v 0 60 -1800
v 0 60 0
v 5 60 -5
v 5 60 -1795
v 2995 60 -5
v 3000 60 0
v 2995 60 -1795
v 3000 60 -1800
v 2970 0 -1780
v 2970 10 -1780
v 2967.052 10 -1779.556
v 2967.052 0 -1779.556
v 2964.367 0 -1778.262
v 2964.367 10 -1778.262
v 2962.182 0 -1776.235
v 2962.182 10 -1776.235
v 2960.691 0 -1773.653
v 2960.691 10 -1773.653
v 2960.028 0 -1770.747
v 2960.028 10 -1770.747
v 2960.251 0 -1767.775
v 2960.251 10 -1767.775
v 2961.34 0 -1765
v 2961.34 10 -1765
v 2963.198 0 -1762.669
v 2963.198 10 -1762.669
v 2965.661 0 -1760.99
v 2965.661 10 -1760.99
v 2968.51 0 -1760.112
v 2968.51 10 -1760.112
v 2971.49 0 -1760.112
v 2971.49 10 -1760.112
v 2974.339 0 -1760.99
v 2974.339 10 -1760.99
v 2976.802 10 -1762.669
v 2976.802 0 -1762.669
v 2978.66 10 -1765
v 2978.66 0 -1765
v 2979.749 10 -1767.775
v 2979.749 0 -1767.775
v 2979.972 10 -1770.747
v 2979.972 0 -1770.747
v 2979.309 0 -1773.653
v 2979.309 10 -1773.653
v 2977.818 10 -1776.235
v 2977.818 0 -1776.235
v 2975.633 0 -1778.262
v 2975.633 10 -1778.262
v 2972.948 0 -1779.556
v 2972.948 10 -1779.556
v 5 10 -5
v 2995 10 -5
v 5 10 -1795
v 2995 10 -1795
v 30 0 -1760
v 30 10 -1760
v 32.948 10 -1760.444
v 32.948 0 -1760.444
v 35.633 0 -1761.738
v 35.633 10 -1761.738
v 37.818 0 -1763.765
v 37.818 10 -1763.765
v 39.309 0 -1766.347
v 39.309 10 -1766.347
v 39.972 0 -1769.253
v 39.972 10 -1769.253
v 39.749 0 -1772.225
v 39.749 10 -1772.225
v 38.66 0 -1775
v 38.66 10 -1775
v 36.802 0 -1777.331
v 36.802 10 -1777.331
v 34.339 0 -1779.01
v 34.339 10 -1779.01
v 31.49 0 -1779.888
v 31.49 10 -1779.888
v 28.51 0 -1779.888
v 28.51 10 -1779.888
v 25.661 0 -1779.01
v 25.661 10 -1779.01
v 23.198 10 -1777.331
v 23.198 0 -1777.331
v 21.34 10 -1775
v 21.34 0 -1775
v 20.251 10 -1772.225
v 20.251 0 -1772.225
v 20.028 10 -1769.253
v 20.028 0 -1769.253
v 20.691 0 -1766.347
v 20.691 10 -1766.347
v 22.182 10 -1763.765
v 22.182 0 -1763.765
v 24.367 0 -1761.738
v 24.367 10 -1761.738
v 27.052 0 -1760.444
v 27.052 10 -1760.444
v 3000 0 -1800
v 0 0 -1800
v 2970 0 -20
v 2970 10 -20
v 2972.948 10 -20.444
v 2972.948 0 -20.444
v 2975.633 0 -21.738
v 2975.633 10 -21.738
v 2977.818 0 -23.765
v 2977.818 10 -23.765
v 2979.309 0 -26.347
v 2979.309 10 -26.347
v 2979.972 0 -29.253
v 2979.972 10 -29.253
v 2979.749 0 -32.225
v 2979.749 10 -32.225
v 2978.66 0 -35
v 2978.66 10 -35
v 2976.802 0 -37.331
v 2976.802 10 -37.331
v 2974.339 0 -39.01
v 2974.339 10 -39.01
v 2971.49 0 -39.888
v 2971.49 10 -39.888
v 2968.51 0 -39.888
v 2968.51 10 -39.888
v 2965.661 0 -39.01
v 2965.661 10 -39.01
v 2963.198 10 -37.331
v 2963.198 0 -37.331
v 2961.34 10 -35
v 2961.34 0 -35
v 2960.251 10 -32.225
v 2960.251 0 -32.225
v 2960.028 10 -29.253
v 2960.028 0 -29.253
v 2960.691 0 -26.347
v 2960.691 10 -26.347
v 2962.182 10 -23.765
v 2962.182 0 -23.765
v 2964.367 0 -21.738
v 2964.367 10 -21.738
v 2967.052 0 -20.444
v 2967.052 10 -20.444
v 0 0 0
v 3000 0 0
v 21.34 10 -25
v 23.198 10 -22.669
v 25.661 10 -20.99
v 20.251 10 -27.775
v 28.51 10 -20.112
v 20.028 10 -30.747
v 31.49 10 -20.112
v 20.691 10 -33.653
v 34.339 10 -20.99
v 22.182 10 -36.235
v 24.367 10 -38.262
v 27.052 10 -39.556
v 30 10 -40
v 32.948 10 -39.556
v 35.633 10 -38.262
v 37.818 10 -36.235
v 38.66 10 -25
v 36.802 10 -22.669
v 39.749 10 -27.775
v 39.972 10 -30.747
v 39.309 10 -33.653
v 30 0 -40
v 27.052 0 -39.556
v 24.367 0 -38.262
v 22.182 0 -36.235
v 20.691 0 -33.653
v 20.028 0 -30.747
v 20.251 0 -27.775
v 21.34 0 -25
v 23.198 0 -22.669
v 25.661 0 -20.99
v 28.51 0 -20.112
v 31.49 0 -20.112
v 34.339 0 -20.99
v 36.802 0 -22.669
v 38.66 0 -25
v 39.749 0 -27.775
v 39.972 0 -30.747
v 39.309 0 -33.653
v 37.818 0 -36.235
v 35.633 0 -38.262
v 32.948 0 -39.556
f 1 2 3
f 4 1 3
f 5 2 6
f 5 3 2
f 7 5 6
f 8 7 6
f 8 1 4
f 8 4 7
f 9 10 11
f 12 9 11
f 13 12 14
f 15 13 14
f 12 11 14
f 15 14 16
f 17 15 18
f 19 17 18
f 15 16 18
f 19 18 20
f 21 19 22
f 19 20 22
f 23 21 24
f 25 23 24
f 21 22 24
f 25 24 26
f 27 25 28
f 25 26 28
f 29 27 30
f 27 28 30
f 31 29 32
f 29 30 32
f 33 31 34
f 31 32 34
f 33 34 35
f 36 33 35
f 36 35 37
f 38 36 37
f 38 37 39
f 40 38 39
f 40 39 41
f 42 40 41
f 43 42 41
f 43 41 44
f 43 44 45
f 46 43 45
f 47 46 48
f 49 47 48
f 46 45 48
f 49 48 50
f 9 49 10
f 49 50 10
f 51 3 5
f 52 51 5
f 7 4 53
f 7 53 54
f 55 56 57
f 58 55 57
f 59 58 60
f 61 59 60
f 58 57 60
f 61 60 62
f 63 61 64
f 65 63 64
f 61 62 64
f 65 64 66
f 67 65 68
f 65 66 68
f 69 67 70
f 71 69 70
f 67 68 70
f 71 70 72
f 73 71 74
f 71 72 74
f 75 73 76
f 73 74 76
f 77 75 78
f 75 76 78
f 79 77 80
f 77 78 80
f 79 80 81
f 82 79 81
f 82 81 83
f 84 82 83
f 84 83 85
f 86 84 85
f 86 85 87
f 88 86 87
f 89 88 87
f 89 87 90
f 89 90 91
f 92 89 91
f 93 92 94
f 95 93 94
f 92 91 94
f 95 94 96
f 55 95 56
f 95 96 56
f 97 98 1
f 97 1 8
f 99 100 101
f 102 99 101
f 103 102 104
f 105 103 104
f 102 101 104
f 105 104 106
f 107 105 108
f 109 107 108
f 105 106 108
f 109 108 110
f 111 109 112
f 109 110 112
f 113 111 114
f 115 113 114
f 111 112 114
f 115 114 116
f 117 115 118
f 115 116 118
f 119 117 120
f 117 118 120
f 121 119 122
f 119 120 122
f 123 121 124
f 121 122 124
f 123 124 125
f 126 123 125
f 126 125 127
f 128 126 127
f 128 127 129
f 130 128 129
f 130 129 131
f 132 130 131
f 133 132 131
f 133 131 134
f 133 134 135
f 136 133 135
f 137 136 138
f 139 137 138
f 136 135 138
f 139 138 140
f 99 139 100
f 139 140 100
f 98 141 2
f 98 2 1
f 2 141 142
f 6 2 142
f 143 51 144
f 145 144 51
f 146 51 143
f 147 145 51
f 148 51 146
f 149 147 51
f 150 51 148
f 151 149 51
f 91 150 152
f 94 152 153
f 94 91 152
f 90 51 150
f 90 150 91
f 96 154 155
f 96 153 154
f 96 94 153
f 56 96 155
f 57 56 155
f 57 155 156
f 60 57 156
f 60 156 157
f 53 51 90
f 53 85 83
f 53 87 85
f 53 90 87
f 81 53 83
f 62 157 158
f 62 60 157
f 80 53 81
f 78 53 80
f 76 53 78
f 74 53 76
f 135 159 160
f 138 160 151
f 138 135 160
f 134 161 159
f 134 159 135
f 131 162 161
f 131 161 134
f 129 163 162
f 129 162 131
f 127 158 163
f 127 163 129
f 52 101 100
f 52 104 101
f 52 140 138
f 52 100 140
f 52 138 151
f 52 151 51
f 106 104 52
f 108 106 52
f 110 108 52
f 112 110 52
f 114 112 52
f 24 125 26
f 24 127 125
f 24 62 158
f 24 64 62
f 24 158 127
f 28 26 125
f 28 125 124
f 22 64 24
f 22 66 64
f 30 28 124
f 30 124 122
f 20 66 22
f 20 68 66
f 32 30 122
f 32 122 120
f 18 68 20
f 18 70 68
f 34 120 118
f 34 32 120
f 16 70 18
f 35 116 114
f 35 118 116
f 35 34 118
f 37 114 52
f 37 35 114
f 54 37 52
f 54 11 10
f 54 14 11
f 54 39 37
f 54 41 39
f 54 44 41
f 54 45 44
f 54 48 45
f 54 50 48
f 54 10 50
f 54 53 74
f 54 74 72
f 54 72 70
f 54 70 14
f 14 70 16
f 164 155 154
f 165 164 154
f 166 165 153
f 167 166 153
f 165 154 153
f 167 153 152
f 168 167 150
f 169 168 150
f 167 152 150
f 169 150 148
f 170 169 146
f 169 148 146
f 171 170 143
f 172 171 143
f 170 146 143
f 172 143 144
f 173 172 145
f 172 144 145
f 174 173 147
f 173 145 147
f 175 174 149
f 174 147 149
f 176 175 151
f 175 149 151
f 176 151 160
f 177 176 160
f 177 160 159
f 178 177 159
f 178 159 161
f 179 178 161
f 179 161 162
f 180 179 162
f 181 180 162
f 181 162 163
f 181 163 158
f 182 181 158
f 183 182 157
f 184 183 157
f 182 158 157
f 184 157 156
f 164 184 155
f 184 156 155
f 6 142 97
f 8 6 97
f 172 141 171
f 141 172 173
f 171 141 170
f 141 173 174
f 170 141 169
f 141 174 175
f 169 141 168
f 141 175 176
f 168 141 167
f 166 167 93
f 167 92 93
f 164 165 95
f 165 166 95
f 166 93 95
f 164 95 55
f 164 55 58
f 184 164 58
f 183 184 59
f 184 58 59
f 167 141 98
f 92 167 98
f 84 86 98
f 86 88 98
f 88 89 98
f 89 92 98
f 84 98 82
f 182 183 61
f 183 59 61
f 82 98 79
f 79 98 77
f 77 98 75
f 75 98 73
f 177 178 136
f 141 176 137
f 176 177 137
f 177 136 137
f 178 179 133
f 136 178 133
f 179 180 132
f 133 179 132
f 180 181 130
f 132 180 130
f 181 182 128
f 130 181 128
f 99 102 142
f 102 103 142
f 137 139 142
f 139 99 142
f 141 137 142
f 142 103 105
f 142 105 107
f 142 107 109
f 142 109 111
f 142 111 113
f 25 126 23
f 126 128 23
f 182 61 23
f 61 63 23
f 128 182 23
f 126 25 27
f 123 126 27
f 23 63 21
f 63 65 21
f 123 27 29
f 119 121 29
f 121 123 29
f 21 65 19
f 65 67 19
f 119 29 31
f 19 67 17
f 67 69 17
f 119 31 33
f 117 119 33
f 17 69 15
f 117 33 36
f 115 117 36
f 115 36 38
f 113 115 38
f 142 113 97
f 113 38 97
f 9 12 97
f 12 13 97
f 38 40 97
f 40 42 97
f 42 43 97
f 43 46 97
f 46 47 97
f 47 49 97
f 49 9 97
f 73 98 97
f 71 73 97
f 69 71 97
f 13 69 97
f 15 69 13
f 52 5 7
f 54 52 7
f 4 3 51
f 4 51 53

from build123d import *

# Parameters (mm, degrees)
SKETCH1_W           = 3000
SKETCH1_H           = 1800
BOSS_EXTRUDE2_DEPTH = 60
SKETCH2_W           = 2990
SKETCH2_H           = 1790
CUT_EXTRUDE1_DEPTH  = 50
SKETCH3_R           = 10
CUT_EXTRUDE2_DEPTH  = 10


with BuildPart() as part:
    # Sketch1 → Boss-Extrude2 (new body)
    with BuildSketch(Plane(origin=(0, 0, 0), x_dir=(1, 0, 0), z_dir=(0, 1, 0))):
        with Locations((1500, 900)):
            Rectangle(SKETCH1_W, SKETCH1_H)
    extrude(amount=BOSS_EXTRUDE2_DEPTH)

    # Sketch2 → Cut-Extrude1 (cut)
    with BuildSketch(Plane(origin=(0, 60, 0), x_dir=(1, 0, 0), z_dir=(0, 1, 0))):
        with Locations((1500, 900)):
            Rectangle(SKETCH2_W, SKETCH2_H)
    extrude(amount=-CUT_EXTRUDE1_DEPTH, mode=Mode.SUBTRACT)

    # Sketch3 → Cut-Extrude2 (cut)
    with BuildSketch(Plane(origin=(0, 10, 0), x_dir=(1, 0, 0), z_dir=(0, 1, 0))):
        with Locations(Location((30, 1770, 0), (0, 0, 270))):
            Circle(SKETCH3_R)
        with Locations(Location((2970, 1770, 0), (0, 0, 90))):
            Circle(SKETCH3_R)
        with Locations(Location((30, 30, 0), (0, 0, 90))):
            Circle(SKETCH3_R)
        with Locations(Location((2970, 30, 0), (0, 0, 270))):
            Circle(SKETCH3_R)
    extrude(amount=-CUT_EXTRUDE2_DEPTH, mode=Mode.SUBTRACT)


solid = part.part
